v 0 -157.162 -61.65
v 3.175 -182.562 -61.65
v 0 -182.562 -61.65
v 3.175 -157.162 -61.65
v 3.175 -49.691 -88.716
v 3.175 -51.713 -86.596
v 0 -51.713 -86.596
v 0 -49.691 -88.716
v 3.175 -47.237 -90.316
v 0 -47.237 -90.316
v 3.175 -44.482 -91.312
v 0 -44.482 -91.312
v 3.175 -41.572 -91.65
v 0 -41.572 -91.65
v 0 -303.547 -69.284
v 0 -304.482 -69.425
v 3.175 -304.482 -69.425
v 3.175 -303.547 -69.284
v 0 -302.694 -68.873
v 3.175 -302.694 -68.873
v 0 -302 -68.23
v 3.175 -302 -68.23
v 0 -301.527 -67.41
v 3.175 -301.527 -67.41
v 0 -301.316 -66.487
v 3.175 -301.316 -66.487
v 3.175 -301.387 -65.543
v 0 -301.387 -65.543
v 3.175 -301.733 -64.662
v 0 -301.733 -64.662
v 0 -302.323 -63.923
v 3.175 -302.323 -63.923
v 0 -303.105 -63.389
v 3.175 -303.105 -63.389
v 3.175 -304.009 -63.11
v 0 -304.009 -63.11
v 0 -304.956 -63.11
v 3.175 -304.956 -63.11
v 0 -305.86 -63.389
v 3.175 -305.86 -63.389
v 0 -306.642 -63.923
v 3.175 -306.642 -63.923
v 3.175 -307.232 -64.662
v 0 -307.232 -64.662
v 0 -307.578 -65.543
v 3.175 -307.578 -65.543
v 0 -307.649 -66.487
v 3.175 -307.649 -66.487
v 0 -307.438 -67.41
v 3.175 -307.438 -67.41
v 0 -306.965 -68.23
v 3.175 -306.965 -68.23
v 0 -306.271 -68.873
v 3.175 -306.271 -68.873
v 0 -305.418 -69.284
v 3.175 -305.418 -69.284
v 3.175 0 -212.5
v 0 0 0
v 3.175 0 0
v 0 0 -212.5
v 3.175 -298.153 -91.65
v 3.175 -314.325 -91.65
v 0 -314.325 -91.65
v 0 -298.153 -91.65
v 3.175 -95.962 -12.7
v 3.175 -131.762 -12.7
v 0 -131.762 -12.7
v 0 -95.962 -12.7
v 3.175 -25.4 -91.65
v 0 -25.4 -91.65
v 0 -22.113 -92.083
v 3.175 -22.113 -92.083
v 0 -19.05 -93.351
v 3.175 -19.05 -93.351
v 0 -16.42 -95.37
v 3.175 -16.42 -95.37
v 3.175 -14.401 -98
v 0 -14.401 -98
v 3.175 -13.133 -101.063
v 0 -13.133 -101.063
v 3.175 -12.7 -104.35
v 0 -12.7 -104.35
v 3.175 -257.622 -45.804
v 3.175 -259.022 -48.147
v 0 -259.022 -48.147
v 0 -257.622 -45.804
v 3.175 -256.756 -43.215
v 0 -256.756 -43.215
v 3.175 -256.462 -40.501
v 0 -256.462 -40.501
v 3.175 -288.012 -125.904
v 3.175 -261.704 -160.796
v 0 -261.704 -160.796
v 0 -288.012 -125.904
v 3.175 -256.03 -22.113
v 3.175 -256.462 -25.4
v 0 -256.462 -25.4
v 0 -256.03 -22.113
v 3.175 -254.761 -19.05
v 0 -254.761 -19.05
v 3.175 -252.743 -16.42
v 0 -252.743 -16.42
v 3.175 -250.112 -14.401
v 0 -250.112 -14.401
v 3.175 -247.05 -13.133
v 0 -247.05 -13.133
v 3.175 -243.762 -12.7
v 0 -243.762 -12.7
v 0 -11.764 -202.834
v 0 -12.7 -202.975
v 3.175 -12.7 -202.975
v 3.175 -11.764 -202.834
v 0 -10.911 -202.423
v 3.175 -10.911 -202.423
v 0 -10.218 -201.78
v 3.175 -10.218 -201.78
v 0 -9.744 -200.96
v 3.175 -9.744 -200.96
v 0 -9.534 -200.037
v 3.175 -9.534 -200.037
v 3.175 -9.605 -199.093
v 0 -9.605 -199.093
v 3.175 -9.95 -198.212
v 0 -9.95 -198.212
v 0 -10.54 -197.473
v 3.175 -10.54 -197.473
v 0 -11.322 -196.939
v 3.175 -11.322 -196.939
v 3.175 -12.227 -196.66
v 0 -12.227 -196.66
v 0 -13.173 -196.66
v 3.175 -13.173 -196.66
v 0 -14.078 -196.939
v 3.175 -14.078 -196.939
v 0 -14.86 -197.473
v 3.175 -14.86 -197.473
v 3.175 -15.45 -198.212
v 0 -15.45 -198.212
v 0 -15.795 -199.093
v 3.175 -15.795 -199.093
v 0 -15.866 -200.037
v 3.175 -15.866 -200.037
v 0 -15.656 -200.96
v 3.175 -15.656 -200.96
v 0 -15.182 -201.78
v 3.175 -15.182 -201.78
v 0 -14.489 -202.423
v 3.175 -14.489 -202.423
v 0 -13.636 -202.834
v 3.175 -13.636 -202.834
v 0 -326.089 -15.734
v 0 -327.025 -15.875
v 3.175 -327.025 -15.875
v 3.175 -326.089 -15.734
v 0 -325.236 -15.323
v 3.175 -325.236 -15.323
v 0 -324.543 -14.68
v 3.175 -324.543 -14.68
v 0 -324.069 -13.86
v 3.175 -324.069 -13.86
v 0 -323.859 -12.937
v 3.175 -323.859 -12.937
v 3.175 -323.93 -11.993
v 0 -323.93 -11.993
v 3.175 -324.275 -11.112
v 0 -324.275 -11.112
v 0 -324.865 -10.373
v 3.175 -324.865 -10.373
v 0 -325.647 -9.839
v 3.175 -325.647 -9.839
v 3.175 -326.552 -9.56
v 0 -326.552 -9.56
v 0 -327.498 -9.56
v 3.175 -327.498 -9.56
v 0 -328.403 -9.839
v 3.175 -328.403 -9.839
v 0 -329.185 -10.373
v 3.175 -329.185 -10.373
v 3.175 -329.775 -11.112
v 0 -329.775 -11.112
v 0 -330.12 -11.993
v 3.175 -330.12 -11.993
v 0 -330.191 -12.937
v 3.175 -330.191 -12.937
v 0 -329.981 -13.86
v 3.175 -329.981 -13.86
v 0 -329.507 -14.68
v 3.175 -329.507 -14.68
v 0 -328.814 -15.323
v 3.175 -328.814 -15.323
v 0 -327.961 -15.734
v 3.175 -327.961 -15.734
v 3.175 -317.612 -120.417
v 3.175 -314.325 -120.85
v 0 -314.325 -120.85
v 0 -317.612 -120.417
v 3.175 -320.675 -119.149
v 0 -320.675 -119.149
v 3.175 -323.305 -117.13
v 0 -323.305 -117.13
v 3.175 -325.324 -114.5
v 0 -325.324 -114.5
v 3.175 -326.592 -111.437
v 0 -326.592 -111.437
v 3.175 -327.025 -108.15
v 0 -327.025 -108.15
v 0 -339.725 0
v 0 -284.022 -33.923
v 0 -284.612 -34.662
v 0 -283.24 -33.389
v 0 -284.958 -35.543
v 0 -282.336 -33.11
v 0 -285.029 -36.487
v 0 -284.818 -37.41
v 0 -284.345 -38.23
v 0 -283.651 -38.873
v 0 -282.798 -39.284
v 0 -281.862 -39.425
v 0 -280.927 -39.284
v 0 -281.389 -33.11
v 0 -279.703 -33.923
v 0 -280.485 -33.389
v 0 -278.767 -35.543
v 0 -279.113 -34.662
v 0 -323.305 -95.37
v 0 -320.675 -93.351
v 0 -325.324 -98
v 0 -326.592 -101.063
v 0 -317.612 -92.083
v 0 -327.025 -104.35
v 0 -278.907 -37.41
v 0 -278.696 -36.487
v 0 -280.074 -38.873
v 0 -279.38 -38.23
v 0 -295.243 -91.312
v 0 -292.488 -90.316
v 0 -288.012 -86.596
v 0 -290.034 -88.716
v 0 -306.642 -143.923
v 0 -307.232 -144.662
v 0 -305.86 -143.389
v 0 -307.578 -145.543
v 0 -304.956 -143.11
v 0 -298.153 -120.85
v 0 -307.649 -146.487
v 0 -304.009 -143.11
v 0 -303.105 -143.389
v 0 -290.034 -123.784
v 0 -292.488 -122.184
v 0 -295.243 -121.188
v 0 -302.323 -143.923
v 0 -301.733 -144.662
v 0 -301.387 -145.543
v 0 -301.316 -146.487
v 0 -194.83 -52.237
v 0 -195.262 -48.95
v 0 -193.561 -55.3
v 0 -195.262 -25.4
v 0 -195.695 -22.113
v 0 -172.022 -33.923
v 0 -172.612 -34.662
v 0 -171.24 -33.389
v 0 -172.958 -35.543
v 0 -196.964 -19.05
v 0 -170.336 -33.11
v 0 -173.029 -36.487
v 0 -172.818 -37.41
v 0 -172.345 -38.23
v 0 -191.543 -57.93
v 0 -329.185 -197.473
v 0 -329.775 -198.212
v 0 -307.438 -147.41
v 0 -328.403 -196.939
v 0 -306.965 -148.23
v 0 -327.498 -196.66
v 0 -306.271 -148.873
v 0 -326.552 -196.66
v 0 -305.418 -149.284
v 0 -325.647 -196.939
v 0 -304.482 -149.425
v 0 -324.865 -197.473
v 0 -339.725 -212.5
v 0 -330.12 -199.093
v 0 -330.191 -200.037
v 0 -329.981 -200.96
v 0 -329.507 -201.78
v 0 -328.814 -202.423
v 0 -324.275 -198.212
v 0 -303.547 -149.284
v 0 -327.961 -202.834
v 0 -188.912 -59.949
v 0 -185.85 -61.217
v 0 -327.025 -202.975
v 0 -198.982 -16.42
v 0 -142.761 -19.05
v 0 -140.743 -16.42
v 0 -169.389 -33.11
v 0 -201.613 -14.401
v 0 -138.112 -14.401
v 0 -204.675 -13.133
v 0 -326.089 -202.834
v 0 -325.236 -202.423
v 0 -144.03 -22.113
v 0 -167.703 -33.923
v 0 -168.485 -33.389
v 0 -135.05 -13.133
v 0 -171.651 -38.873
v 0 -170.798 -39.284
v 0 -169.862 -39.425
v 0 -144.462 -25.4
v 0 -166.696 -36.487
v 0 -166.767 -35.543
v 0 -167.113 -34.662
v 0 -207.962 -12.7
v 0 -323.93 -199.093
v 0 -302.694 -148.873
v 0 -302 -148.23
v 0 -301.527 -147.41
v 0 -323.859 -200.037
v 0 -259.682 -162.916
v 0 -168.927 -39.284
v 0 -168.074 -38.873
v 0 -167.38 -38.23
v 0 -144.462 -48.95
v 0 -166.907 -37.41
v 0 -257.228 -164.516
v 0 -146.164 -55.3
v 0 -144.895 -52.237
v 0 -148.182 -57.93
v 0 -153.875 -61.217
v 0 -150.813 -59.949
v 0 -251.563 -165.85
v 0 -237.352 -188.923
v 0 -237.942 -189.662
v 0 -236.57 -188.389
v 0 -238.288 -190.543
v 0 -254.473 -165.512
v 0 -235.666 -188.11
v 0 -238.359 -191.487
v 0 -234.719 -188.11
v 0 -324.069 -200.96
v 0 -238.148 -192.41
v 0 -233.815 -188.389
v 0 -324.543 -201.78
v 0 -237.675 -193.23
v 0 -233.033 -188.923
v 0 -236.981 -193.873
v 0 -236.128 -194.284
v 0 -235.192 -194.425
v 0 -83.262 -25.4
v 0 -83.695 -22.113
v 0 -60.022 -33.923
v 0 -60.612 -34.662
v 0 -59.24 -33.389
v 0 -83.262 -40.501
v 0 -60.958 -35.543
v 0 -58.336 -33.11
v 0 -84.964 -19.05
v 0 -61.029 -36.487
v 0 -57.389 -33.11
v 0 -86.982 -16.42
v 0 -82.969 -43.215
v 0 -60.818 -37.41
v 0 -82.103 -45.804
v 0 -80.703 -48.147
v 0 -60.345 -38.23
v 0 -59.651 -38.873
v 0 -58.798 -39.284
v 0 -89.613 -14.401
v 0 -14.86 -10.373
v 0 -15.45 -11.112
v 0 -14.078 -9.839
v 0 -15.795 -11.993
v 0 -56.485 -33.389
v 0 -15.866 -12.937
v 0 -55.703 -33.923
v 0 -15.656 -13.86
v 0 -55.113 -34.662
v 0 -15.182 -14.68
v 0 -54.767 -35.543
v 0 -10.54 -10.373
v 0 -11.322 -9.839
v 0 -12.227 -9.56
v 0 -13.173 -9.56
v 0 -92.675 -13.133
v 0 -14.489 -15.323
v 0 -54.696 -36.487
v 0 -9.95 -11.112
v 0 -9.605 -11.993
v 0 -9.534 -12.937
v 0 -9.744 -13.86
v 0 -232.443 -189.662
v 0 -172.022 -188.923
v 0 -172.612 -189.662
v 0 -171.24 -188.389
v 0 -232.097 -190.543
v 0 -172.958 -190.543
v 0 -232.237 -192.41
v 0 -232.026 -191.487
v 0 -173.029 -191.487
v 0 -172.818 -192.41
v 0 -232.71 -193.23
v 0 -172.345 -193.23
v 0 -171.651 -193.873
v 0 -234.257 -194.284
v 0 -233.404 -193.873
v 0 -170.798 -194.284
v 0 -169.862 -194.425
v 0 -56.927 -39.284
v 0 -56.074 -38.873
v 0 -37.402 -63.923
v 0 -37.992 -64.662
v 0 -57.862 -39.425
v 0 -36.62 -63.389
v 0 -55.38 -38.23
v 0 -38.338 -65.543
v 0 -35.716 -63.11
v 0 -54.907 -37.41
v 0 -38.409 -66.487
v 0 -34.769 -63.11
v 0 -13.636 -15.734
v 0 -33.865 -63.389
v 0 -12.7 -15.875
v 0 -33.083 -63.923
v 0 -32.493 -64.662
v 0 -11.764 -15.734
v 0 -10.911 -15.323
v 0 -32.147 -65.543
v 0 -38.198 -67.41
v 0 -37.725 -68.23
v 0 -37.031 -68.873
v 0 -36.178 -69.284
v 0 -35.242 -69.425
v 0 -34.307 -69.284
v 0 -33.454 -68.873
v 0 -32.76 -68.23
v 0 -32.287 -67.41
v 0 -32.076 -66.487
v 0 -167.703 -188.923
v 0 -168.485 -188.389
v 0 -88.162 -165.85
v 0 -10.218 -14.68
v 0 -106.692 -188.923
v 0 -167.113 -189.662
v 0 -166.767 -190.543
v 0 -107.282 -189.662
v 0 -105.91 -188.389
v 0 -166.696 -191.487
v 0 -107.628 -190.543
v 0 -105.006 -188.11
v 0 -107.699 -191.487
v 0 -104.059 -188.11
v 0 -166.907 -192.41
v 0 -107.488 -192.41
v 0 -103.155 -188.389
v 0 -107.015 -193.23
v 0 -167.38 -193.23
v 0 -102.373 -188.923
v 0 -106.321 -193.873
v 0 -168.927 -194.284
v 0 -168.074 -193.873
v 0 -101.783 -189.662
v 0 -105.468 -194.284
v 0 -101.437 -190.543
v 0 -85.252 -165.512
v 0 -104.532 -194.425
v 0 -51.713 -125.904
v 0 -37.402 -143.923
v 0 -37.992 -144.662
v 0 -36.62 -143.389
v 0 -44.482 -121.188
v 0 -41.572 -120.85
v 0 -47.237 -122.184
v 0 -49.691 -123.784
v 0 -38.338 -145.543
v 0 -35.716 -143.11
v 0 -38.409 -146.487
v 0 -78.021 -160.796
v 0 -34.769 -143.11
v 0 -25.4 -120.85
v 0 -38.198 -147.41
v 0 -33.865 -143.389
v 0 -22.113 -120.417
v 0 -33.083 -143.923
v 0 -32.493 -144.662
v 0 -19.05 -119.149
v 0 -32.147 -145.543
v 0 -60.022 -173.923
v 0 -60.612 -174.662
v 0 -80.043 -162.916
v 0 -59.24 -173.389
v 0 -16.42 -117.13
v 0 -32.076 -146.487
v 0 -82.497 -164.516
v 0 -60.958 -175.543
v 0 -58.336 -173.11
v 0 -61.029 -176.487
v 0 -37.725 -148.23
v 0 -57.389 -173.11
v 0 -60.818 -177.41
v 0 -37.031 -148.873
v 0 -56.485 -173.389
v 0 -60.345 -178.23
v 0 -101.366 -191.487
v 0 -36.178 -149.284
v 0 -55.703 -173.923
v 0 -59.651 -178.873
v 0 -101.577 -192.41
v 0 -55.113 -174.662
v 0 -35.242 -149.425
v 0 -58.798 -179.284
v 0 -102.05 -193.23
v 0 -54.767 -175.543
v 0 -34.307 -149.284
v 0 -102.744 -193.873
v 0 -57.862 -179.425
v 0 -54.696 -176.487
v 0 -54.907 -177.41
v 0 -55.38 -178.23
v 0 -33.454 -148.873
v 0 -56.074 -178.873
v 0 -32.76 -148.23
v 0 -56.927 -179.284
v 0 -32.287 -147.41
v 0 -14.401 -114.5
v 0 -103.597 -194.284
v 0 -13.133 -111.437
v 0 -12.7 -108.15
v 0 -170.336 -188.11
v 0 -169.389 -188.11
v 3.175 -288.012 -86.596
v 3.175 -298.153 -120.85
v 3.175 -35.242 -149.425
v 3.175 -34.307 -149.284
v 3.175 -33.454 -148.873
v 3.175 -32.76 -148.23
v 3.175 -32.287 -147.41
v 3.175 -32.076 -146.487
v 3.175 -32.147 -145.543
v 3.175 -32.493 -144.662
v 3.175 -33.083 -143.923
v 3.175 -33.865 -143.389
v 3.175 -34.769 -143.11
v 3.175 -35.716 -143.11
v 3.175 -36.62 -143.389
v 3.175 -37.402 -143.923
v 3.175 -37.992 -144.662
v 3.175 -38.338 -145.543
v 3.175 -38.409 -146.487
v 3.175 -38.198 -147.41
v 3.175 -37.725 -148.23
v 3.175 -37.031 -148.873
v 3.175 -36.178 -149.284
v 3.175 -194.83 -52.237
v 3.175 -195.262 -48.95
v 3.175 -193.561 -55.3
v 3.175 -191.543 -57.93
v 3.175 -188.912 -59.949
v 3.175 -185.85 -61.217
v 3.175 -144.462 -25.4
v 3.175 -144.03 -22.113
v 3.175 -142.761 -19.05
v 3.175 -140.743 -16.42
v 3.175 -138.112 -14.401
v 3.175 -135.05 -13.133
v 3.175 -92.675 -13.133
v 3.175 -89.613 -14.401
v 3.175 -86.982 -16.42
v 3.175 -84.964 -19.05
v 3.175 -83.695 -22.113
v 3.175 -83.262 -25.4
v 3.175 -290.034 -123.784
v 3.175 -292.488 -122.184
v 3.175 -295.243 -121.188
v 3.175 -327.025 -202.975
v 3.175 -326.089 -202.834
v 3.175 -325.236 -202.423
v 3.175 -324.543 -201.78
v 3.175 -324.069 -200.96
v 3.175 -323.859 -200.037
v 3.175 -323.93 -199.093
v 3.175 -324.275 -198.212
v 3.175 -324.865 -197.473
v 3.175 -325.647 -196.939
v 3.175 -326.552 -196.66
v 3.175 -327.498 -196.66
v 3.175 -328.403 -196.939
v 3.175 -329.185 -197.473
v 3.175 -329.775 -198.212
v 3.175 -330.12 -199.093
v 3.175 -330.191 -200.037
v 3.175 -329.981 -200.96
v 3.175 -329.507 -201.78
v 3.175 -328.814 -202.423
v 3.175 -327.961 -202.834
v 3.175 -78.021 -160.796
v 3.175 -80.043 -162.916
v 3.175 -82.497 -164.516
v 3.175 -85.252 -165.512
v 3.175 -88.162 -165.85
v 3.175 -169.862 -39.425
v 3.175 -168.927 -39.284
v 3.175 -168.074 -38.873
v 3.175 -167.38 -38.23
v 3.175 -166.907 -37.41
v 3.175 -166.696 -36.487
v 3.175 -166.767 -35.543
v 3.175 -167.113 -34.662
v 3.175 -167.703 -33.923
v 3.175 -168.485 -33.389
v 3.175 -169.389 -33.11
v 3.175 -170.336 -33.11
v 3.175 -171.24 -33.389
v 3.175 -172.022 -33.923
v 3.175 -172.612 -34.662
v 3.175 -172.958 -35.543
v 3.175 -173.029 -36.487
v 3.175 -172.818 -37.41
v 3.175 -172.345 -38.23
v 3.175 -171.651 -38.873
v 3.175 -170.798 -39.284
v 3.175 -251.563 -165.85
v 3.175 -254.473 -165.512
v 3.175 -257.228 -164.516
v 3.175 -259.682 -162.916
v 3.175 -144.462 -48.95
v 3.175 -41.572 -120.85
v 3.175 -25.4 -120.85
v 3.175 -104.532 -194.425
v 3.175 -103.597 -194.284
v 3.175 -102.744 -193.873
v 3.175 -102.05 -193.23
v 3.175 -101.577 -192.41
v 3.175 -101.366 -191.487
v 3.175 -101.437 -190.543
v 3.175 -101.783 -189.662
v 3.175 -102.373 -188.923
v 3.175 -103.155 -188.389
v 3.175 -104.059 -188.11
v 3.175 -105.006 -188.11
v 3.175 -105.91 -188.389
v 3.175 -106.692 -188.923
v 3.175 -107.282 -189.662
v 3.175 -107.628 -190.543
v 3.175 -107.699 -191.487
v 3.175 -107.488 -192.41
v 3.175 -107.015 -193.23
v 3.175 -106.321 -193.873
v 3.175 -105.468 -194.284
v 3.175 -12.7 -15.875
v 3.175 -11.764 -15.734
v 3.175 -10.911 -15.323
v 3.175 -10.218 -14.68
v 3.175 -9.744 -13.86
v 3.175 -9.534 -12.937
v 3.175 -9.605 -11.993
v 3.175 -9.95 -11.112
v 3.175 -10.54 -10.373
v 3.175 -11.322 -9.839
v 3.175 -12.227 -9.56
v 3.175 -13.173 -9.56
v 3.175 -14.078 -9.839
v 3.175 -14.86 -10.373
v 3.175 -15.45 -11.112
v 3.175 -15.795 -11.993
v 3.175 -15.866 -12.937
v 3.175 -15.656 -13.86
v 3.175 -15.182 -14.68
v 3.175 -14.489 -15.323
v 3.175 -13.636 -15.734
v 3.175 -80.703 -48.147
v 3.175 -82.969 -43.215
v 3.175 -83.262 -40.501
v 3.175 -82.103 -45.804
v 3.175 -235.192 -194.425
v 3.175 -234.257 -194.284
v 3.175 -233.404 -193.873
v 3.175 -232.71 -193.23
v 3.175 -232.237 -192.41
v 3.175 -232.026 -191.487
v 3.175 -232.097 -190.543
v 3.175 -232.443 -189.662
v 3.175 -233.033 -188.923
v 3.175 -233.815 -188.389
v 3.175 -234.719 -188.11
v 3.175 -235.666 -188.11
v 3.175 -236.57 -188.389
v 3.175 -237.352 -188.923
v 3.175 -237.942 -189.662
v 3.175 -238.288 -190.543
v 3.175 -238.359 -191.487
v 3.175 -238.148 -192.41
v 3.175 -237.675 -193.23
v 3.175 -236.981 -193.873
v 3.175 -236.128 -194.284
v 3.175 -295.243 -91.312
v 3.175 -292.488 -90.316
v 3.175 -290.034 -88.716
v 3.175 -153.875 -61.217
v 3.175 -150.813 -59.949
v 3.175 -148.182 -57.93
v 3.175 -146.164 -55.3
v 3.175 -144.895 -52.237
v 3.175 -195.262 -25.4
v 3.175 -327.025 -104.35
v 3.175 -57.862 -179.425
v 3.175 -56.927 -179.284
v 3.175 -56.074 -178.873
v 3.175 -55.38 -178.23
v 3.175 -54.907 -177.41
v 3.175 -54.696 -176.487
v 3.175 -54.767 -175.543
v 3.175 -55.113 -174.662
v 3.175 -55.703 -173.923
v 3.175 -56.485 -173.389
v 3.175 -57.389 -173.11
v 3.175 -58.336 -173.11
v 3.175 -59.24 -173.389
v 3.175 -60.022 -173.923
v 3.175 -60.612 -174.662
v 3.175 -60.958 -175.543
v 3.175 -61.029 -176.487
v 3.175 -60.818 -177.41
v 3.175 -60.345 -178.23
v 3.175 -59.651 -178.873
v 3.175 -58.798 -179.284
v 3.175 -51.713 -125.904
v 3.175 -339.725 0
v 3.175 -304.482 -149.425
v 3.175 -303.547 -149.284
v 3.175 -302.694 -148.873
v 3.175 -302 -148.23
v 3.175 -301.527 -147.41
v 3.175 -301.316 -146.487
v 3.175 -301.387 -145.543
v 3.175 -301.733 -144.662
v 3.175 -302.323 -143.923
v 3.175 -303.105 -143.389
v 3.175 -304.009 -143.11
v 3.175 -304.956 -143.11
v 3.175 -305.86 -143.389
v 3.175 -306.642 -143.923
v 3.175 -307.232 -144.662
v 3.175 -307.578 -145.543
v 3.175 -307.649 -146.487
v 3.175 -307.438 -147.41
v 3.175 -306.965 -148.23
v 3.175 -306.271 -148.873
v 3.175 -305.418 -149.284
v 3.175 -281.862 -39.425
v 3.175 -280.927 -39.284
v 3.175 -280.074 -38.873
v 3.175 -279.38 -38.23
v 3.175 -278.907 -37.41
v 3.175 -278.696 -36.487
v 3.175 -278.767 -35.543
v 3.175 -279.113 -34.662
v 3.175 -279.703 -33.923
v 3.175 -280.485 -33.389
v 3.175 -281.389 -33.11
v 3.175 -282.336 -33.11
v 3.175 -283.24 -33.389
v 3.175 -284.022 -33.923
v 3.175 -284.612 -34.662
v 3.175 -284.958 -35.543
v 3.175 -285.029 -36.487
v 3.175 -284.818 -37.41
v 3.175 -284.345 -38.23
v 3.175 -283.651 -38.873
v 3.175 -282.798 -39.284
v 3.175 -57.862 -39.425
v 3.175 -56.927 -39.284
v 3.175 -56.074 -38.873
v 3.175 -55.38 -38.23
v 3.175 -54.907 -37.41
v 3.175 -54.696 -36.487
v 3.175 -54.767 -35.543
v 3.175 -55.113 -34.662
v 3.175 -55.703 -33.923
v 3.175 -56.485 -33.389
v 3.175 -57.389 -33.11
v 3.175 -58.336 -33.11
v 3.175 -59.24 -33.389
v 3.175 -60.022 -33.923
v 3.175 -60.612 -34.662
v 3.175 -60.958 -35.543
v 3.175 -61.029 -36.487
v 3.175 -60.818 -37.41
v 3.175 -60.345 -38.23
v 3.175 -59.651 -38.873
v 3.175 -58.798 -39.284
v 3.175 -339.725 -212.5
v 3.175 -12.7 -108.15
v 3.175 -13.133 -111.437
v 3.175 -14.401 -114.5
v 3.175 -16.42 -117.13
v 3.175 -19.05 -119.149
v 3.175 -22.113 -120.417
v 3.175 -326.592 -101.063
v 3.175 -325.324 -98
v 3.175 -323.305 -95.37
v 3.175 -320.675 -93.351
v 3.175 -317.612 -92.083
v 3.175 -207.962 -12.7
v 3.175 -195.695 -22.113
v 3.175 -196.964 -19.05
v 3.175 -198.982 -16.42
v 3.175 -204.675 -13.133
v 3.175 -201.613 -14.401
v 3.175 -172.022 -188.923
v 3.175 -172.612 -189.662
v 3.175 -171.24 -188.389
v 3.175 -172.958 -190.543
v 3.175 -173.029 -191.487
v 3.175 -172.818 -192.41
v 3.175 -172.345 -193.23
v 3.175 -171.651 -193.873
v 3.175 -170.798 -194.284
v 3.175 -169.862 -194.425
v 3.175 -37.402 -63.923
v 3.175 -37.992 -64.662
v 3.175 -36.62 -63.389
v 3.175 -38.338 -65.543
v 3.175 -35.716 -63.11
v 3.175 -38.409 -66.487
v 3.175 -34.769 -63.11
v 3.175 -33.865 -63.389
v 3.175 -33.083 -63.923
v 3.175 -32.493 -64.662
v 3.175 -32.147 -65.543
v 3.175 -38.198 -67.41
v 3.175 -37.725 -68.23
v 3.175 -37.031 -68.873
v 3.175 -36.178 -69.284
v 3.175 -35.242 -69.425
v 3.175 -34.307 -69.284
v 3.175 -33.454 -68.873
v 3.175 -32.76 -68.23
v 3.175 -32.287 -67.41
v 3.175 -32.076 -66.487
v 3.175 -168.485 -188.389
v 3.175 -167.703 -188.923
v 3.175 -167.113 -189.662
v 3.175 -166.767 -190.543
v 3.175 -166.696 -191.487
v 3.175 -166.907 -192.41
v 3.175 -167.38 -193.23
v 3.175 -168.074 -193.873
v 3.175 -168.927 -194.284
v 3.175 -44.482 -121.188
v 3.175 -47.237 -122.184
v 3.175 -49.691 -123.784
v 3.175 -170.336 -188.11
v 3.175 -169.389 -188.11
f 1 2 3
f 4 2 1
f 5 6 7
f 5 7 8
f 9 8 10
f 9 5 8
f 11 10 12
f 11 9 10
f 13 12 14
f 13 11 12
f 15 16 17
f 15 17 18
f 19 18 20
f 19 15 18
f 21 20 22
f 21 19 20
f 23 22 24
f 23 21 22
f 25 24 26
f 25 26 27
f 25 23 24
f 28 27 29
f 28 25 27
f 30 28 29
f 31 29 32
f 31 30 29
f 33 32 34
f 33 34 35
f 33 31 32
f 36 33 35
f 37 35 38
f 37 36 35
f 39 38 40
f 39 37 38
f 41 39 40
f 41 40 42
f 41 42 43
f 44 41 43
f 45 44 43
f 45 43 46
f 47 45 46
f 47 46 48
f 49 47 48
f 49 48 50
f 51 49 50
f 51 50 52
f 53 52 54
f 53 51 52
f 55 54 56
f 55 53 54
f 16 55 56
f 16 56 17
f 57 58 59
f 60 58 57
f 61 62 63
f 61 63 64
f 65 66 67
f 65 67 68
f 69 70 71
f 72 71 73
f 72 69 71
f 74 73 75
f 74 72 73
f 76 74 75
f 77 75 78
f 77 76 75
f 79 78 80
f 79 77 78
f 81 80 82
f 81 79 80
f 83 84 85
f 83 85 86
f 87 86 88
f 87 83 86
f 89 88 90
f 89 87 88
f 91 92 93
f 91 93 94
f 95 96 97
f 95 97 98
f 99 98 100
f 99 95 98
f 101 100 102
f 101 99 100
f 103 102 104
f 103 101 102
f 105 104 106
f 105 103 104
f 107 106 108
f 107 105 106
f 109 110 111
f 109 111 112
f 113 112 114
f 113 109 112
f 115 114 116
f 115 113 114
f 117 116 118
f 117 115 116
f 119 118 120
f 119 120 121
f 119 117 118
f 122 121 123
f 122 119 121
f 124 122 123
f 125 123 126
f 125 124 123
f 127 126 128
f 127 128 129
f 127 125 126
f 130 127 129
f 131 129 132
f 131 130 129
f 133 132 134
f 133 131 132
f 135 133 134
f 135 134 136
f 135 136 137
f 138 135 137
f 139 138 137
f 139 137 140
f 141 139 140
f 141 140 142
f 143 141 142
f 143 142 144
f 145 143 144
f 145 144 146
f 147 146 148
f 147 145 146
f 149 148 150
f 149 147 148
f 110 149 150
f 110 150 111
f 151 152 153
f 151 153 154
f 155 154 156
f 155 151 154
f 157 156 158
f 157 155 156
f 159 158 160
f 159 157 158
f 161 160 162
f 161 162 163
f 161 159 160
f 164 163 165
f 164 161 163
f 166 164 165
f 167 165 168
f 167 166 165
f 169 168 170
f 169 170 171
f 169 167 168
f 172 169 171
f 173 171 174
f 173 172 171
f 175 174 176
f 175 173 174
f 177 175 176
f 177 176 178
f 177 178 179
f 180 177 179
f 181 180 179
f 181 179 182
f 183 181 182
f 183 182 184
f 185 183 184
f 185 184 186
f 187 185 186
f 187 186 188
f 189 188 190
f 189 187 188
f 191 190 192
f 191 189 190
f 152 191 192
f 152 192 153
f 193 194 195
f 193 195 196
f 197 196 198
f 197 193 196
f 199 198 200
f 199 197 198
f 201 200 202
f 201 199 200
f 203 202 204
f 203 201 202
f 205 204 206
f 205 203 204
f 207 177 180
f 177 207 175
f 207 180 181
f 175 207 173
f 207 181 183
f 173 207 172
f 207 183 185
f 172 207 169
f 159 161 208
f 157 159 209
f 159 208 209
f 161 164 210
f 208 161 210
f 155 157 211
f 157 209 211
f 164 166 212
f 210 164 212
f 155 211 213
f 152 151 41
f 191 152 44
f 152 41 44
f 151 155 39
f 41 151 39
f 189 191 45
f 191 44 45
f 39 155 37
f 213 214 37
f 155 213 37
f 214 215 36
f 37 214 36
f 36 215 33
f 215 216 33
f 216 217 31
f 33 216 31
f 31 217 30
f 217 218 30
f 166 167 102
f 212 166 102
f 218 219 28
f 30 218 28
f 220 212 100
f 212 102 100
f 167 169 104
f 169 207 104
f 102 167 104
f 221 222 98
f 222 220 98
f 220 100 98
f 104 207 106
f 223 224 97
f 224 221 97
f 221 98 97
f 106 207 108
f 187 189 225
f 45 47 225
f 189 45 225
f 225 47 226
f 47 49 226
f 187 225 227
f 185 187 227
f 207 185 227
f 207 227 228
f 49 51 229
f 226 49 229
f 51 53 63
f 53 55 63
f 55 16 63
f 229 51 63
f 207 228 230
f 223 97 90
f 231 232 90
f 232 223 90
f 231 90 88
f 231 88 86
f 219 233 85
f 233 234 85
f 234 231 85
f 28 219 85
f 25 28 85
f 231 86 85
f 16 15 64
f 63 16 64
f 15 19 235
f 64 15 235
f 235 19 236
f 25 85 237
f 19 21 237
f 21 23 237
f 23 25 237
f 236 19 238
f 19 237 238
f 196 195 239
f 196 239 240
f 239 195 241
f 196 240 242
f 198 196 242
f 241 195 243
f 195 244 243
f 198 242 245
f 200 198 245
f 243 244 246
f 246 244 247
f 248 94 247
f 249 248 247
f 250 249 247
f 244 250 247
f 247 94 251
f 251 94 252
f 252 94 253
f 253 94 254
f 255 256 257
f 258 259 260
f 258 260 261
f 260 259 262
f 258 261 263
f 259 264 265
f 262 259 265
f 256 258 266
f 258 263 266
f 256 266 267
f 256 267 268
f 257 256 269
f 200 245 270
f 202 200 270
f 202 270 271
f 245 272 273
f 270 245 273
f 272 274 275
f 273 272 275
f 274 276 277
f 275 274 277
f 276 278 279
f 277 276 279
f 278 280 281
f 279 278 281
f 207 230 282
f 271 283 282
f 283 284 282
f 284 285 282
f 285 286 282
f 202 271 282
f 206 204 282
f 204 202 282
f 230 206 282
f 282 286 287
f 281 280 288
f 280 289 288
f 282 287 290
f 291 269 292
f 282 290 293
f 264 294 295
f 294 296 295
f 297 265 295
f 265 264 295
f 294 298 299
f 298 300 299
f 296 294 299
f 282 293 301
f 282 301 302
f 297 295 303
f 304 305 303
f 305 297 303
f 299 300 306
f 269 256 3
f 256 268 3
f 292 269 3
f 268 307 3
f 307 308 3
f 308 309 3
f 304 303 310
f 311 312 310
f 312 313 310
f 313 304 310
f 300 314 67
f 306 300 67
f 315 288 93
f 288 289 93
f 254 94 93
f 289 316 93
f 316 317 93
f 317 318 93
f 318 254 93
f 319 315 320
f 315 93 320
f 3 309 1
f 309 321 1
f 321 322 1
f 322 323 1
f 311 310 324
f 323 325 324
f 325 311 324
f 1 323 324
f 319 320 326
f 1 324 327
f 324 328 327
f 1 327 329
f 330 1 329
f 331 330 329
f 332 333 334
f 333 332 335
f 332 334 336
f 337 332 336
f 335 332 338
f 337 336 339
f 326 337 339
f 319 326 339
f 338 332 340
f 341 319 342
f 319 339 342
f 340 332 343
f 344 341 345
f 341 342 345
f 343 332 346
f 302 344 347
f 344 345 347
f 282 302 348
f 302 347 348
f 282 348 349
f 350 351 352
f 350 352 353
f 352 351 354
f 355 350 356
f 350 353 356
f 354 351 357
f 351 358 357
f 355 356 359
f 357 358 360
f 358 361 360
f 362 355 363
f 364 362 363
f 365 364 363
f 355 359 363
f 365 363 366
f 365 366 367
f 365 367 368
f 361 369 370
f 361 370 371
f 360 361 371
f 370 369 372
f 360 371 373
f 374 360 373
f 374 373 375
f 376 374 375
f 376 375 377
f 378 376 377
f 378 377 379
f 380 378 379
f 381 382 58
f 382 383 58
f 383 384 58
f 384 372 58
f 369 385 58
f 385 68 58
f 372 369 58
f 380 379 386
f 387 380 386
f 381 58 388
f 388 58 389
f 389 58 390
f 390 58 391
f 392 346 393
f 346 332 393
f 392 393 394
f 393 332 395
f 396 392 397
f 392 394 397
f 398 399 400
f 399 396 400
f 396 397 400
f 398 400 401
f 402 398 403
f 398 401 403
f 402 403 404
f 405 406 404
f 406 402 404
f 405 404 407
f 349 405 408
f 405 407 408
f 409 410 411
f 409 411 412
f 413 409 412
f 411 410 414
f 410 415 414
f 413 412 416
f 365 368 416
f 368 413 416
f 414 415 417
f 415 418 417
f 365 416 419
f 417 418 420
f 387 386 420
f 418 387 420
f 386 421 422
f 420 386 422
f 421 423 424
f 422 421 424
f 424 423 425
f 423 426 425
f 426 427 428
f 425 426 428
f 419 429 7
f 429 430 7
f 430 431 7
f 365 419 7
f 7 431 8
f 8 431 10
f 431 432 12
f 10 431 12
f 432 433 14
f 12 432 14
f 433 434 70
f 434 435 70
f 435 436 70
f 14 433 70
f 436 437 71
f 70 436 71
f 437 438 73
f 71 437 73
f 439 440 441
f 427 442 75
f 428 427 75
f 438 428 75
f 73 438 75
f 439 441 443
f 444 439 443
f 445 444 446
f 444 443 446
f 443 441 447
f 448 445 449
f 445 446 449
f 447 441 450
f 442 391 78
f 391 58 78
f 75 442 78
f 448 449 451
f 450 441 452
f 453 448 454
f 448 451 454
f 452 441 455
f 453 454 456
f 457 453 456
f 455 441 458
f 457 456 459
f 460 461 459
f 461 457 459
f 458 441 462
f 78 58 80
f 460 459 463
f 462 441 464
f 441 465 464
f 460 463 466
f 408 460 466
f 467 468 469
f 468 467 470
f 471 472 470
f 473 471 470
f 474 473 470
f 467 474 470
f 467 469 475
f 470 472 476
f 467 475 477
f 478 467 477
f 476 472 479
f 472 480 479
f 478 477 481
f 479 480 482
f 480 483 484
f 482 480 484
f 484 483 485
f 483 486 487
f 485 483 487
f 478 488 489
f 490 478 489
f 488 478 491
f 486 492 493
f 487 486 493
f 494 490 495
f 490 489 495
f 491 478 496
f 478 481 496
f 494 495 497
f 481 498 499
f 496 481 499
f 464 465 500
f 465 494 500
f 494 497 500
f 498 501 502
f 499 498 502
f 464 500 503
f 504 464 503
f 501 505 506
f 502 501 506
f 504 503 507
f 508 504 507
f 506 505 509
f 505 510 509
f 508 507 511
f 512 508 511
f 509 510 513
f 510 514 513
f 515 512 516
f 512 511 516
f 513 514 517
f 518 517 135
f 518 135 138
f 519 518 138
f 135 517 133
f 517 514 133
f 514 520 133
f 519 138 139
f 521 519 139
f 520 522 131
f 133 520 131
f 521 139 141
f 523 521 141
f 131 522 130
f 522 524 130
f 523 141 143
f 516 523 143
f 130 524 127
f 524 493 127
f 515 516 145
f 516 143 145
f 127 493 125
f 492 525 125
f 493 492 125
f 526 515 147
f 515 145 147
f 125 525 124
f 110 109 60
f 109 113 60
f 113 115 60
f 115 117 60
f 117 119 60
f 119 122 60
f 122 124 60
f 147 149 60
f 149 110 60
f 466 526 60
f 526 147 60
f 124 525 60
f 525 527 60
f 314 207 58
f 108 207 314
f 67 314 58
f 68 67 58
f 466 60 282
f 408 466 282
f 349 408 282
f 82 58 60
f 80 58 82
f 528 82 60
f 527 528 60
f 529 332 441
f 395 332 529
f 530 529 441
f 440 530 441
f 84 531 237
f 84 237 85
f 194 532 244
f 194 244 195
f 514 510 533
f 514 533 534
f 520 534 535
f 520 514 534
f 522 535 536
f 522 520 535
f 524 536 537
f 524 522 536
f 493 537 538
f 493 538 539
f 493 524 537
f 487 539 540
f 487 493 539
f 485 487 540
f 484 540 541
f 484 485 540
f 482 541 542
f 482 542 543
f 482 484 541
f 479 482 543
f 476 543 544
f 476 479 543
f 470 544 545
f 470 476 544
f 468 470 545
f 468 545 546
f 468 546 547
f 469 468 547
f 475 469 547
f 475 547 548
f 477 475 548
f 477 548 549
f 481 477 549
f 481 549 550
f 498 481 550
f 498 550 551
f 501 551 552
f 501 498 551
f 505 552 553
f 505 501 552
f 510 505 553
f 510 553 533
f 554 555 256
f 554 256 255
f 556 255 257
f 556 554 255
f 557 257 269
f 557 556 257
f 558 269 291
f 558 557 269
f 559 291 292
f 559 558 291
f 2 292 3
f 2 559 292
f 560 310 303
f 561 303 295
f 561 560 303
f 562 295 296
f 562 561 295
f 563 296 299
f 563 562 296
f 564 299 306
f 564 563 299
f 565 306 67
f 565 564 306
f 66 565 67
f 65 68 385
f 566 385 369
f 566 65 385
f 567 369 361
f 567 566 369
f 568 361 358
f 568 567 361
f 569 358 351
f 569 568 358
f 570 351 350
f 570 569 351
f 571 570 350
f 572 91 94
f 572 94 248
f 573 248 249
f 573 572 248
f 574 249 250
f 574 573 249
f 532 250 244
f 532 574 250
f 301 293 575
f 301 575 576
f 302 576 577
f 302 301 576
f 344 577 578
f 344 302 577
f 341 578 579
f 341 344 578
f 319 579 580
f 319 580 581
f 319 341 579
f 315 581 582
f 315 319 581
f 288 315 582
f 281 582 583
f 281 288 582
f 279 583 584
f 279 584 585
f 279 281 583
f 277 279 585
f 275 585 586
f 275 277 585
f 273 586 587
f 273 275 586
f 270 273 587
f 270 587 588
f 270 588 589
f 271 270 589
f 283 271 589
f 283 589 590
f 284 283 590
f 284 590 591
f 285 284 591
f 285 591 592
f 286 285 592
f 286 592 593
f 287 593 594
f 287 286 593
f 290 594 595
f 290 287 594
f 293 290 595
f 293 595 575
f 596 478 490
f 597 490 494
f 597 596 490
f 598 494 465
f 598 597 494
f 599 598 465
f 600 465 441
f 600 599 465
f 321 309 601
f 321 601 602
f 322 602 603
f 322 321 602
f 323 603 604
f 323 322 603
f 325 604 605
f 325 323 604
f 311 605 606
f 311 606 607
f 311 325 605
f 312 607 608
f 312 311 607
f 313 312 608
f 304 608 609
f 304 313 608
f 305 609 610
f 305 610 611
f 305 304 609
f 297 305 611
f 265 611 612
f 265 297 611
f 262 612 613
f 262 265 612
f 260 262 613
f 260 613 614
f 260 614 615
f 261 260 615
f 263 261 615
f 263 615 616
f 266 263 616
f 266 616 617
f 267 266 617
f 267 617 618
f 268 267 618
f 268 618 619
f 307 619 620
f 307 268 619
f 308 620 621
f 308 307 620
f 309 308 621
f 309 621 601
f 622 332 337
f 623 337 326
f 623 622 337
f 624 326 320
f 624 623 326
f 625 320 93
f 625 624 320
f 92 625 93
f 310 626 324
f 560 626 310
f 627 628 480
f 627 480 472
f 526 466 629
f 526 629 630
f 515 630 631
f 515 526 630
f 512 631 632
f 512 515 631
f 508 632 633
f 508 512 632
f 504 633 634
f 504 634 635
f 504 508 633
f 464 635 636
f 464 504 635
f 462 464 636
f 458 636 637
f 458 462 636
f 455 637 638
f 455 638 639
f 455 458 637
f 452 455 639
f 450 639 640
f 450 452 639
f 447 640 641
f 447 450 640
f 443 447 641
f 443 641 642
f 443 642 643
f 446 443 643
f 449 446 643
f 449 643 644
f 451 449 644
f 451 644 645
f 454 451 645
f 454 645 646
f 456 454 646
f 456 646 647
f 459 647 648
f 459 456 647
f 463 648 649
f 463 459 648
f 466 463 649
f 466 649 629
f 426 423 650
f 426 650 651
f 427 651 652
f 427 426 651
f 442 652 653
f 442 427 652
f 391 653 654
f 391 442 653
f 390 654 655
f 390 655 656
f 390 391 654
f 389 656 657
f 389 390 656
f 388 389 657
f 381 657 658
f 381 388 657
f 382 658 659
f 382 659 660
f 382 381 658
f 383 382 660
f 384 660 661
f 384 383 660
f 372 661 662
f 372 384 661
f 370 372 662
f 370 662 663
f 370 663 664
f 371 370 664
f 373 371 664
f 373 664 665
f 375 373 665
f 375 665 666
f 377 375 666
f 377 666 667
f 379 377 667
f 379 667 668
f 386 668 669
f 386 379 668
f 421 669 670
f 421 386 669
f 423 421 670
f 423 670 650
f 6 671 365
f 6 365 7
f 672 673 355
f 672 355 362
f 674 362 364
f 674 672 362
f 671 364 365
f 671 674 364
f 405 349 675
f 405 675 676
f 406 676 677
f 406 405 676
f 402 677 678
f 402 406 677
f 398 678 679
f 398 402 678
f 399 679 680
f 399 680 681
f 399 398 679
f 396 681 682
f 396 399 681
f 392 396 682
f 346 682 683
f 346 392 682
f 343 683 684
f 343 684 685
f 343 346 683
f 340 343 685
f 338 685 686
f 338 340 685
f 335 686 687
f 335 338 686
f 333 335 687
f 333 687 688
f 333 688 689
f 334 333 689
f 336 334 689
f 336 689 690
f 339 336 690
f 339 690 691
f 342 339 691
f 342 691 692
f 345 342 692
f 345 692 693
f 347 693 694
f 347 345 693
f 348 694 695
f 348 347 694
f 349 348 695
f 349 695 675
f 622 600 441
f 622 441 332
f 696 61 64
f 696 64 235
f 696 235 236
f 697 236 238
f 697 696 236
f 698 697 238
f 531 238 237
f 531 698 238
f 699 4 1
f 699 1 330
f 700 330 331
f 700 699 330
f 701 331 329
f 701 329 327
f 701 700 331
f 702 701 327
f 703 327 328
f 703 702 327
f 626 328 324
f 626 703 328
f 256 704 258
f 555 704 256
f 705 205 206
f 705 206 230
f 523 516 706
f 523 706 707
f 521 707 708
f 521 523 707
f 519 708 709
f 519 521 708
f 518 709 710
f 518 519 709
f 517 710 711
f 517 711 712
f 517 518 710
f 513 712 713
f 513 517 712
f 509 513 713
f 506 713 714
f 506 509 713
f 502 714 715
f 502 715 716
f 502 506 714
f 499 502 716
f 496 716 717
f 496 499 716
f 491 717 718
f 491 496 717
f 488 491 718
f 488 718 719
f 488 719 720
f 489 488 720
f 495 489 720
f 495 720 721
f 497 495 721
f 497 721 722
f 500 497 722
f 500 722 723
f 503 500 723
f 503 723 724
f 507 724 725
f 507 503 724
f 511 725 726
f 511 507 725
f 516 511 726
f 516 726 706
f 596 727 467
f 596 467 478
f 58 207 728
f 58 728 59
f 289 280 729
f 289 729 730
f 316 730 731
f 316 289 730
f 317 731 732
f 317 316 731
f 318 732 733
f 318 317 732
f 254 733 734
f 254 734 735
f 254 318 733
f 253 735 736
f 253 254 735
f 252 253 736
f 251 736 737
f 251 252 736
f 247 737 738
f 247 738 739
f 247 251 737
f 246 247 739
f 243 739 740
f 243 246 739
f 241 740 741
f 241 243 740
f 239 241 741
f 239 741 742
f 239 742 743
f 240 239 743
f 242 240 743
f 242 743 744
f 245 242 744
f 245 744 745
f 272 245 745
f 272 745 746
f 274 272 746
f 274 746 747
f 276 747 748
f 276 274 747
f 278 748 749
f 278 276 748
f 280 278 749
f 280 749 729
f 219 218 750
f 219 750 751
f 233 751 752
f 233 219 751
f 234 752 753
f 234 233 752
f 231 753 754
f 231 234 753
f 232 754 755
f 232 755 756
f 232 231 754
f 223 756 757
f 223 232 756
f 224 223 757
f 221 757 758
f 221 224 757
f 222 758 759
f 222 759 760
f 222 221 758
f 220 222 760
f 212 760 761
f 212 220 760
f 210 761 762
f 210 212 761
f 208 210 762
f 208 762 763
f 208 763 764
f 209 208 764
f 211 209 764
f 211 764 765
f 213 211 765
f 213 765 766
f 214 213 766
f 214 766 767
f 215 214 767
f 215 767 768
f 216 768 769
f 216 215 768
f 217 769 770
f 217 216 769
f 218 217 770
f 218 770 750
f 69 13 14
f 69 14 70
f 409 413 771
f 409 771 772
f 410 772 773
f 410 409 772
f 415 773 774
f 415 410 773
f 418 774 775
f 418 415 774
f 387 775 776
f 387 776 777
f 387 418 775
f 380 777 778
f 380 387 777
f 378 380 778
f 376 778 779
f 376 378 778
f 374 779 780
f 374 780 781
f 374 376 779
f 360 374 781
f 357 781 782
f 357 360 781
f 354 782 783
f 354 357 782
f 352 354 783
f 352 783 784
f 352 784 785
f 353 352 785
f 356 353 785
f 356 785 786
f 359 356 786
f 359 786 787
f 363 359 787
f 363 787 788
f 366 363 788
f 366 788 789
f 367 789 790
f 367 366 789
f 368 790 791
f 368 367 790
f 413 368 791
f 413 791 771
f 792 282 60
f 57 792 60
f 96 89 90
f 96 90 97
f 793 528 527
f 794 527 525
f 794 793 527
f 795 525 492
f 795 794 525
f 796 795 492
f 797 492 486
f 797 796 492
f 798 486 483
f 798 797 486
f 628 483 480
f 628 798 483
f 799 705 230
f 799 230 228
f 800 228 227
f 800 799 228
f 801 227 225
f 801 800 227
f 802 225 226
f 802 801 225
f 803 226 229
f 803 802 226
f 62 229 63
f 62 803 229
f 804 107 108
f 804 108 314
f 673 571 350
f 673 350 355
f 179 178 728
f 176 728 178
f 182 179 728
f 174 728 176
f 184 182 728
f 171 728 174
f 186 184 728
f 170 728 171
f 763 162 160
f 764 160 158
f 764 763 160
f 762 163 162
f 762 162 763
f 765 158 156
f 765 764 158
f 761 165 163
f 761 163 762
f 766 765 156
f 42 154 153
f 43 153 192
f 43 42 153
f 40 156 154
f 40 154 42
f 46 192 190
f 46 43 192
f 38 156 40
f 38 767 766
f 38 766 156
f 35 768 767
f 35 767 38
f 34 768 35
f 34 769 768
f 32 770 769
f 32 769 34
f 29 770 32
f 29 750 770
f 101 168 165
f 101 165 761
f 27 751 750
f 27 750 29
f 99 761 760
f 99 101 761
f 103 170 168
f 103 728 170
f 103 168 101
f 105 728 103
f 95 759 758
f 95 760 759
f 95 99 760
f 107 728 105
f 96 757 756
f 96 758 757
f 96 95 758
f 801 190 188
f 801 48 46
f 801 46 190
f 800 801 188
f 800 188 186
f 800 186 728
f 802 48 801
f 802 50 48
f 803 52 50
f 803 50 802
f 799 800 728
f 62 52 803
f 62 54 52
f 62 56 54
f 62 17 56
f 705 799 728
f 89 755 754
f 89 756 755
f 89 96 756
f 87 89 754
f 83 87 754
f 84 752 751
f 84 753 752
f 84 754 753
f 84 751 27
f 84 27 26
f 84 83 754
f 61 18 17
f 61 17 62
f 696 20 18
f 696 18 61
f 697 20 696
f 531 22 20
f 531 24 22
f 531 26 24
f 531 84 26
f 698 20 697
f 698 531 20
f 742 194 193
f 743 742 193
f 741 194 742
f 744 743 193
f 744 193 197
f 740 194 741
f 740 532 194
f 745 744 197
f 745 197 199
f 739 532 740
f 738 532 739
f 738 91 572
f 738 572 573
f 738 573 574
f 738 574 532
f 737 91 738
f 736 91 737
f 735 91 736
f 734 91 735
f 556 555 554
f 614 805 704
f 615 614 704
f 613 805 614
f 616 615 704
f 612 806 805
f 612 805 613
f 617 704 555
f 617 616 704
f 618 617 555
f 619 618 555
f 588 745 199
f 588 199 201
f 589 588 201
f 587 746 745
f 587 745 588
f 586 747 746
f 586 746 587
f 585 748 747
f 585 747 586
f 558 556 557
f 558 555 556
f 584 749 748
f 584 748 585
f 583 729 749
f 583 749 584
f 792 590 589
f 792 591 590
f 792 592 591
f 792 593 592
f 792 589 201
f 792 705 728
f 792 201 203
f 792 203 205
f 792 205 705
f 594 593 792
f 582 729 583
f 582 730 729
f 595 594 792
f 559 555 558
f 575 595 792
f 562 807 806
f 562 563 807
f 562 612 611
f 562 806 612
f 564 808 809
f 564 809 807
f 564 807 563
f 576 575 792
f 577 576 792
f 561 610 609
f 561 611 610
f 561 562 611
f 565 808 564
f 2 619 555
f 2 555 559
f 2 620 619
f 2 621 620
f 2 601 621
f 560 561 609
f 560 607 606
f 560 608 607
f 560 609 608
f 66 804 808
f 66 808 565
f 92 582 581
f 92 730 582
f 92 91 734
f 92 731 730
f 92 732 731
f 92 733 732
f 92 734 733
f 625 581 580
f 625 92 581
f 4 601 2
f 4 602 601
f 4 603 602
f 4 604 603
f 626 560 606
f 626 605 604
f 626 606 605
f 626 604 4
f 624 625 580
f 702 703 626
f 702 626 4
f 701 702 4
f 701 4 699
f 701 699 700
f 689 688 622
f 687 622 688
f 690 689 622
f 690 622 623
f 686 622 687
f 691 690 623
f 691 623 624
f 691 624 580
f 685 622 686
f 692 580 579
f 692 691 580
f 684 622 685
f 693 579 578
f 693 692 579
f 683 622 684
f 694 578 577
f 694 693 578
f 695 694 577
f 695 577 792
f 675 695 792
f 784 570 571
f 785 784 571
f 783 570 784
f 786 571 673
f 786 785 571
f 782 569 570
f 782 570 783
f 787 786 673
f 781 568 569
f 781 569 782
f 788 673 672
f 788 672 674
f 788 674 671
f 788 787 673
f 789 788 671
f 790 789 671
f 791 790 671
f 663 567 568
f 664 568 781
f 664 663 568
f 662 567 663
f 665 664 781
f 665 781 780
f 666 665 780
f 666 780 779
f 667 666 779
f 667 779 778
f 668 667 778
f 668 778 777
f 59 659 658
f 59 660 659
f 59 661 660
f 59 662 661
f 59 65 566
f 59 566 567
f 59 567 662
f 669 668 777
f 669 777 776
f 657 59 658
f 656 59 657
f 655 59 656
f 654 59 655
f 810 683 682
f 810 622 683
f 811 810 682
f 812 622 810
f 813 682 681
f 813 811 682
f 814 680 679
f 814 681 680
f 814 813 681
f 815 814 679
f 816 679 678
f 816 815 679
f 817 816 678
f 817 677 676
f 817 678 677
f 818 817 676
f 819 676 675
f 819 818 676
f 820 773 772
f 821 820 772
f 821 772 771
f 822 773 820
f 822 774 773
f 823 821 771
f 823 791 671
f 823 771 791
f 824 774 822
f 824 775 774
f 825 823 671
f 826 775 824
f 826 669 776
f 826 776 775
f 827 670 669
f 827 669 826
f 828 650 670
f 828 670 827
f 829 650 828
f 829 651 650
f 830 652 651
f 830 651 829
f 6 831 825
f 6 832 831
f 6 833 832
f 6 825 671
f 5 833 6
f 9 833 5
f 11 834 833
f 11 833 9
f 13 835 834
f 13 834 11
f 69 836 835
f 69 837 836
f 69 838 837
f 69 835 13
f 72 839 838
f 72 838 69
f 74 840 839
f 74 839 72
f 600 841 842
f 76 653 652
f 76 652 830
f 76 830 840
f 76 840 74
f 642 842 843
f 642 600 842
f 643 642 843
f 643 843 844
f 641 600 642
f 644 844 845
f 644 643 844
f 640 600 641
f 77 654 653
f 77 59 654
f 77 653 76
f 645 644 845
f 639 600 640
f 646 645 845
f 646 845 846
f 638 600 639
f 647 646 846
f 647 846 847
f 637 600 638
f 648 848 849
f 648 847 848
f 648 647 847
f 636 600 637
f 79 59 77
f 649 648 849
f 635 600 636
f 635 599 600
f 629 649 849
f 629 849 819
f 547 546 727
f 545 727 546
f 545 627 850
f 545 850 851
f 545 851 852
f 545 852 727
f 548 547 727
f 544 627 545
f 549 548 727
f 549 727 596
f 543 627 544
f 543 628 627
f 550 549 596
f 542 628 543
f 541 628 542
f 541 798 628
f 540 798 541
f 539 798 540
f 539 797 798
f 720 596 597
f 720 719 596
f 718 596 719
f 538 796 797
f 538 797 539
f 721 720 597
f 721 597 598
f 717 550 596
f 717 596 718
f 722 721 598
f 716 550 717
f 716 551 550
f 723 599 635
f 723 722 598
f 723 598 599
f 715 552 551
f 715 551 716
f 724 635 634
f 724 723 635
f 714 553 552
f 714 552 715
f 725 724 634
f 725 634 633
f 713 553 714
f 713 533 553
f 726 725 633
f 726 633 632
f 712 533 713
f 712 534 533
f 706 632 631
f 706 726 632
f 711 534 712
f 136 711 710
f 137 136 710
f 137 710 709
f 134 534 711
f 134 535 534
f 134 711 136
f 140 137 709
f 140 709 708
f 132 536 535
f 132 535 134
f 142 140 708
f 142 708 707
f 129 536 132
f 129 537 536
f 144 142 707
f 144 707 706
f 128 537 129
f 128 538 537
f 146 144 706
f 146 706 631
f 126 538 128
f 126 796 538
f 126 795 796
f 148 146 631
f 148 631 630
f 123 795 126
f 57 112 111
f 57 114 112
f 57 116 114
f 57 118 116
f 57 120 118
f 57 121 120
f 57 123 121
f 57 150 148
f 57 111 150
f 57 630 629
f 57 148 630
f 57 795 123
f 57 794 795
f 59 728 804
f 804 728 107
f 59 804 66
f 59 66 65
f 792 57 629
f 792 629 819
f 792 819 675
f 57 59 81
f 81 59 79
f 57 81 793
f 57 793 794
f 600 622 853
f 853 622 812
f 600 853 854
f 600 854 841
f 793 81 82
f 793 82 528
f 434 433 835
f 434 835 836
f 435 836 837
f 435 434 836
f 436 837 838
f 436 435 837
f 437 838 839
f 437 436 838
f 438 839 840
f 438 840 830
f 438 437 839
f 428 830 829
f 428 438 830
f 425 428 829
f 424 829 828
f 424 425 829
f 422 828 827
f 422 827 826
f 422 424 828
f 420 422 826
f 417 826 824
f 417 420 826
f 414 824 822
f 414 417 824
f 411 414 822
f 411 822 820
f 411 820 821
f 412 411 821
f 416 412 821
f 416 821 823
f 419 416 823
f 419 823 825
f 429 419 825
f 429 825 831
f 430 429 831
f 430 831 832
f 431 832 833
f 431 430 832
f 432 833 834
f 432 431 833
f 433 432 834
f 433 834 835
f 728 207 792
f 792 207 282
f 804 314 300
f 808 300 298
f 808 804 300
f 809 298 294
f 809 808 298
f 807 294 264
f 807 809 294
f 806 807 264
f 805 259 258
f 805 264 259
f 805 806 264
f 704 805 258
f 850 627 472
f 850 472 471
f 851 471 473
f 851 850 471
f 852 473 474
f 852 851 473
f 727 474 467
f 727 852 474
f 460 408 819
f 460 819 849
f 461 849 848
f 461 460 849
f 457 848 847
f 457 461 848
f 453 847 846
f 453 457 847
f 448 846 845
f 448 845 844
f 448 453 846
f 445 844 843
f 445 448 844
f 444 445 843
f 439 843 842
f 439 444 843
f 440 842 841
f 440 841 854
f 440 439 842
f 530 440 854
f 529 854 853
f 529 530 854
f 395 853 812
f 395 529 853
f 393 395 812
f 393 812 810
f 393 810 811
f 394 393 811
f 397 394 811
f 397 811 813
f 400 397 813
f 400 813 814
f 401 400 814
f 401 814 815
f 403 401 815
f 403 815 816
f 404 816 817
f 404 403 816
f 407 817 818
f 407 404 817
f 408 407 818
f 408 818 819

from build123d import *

# Parameters (mm, degrees)
SKETCH1_W           = 212.5
SKETCH1_H           = 339.725
SKETCH1_R           = 3.175
BOSS_EXTRUDE1_DEPTH = 3.175
CUT_EXTRUDE1_DEPTH  = 4.175


with BuildPart() as part:
    # Sketch1 → Boss-Extrude1 (new body)
    with BuildSketch(Plane(origin=(0, 0, 0), x_dir=(0, 0, -1), z_dir=(1, 0, 0))):
        with Locations((106.25, -169.8625)):
            Rectangle(SKETCH1_W, SKETCH1_H)
        with Locations((12.7, -12.7)):
            Circle(SKETCH1_R, mode=Mode.SUBTRACT)
        with Locations((199.8, -12.7)):
            Circle(SKETCH1_R, mode=Mode.SUBTRACT)
        with Locations((66.25, -35.2425)):
            Circle(SKETCH1_R, mode=Mode.SUBTRACT)
        with Locations((146.25, -35.2425)):
            Circle(SKETCH1_R, mode=Mode.SUBTRACT)
        with Locations((176.25, -57.8625)):
            Circle(SKETCH1_R, mode=Mode.SUBTRACT)
        with Locations((36.25, -57.8625)):
            Circle(SKETCH1_R, mode=Mode.SUBTRACT)
        with Locations((191.25, -104.5325)):
            Circle(SKETCH1_R, mode=Mode.SUBTRACT)
        with Locations((36.25, -169.8625)):
            Circle(SKETCH1_R, mode=Mode.SUBTRACT)
        with Locations((191.25, -169.8625)):
            Circle(SKETCH1_R, mode=Mode.SUBTRACT)
        with Locations((36.25, -281.8625)):
            Circle(SKETCH1_R, mode=Mode.SUBTRACT)
        with Locations((66.25, -304.4825)):
            Circle(SKETCH1_R, mode=Mode.SUBTRACT)
        with Locations((12.7, -327.025)):
            Circle(SKETCH1_R, mode=Mode.SUBTRACT)
        with Locations((199.8, -327.025)):
            Circle(SKETCH1_R, mode=Mode.SUBTRACT)
        with Locations((146.25, -304.4825)):
            Circle(SKETCH1_R, mode=Mode.SUBTRACT)
        with Locations((191.25, -235.1925)):
            Circle(SKETCH1_R, mode=Mode.SUBTRACT)
    extrude(amount=BOSS_EXTRUDE1_DEPTH)

    # Sketch2 → Cut-Extrude1 (cut, through all)
    with BuildSketch(Plane(origin=(3.175, 0, 0), x_dir=(0, 0, -1), z_dir=(1, 0, 0))):
        with BuildLine():
            Line((165.85, -88.161695758), (165.85, -251.563304242))
            ThreePointArc((165.85, -251.563304242), (164.516472011, -257.22840036), (160.795934799, -261.703801323))
            Line((160.795934799, -261.703801323), (125.904065201, -288.012271))
            ThreePointArc((125.904065201, -288.012271), (122.183527989, -292.487671963), (120.85, -298.152768081))
            Line((120.85, -298.152768081), (120.85, -314.325))
            ThreePointArc((120.85, -314.325), (117.130256121, -323.305256121), (108.15, -327.025))
            Line((108.15, -327.025), (104.35, -327.025))
            ThreePointArc((104.35, -327.025), (95.369743879, -323.305256121), (91.65, -314.325))
            Line((91.65, -314.325), (91.65, -298.152768081))
            ThreePointArc((91.65, -298.152768081), (90.316472011, -292.487671963), (86.595934799, -288.012271))
            Line((86.595934799, -288.012271), (48.147303392, -259.022002919))
            ThreePointArc((48.147303392, -259.022002919), (44.532850149, -257.119362682), (40.501368593, -256.4625))
            Line((40.501368593, -256.4625), (25.4, -256.4625))
            ThreePointArc((25.4, -256.4625), (16.419743879, -252.742756121), (12.7, -243.7625))
            Line((12.7, -243.7625), (12.7, -207.9625))
            ThreePointArc((12.7, -207.9625), (16.419743879, -198.982243879), (25.4, -195.2625))
            Line((25.4, -195.2625), (48.95, -195.2625))
            ThreePointArc((48.95, -195.2625), (57.930256121, -191.542756121), (61.65, -182.5625))
            Line((61.65, -182.5625), (61.65, -157.1625))
            ThreePointArc((61.65, -157.1625), (57.930256121, -148.182243879), (48.95, -144.4625))
            Line((48.95, -144.4625), (25.4, -144.4625))
            ThreePointArc((25.4, -144.4625), (16.419743879, -140.742756121), (12.7, -131.7625))
            Line((12.7, -131.7625), (12.7, -95.9625))
            ThreePointArc((12.7, -95.9625), (16.419743879, -86.982243879), (25.4, -83.2625))
            Line((25.4, -83.2625), (40.501368593, -83.2625))
            ThreePointArc((40.501368593, -83.2625), (44.532850149, -82.605637318), (48.147303392, -80.702997081))
            Line((48.147303392, -80.702997081), (86.595934799, -51.712729))
            ThreePointArc((86.595934799, -51.712729), (90.316472011, -47.237328037), (91.65, -41.572231919))
            Line((91.65, -41.572231919), (91.65, -25.4))
            ThreePointArc((91.65, -25.4), (95.369743879, -16.419743879), (104.35, -12.7))
            Line((104.35, -12.7), (108.15, -12.7))
            ThreePointArc((108.15, -12.7), (117.130256121, -16.419743879), (120.85, -25.4))
            Line((120.85, -25.4), (120.85, -41.572231919))
            ThreePointArc((120.85, -41.572231919), (122.183527989, -47.237328037), (125.904065201, -51.712729))
            Line((125.904065201, -51.712729), (160.795934799, -78.021198677))
            ThreePointArc((160.795934799, -78.021198677), (164.516472011, -82.49659964), (165.85, -88.161695758))
        make_face()
    extrude(amount=-CUT_EXTRUDE1_DEPTH, mode=Mode.SUBTRACT)


solid = part.part
